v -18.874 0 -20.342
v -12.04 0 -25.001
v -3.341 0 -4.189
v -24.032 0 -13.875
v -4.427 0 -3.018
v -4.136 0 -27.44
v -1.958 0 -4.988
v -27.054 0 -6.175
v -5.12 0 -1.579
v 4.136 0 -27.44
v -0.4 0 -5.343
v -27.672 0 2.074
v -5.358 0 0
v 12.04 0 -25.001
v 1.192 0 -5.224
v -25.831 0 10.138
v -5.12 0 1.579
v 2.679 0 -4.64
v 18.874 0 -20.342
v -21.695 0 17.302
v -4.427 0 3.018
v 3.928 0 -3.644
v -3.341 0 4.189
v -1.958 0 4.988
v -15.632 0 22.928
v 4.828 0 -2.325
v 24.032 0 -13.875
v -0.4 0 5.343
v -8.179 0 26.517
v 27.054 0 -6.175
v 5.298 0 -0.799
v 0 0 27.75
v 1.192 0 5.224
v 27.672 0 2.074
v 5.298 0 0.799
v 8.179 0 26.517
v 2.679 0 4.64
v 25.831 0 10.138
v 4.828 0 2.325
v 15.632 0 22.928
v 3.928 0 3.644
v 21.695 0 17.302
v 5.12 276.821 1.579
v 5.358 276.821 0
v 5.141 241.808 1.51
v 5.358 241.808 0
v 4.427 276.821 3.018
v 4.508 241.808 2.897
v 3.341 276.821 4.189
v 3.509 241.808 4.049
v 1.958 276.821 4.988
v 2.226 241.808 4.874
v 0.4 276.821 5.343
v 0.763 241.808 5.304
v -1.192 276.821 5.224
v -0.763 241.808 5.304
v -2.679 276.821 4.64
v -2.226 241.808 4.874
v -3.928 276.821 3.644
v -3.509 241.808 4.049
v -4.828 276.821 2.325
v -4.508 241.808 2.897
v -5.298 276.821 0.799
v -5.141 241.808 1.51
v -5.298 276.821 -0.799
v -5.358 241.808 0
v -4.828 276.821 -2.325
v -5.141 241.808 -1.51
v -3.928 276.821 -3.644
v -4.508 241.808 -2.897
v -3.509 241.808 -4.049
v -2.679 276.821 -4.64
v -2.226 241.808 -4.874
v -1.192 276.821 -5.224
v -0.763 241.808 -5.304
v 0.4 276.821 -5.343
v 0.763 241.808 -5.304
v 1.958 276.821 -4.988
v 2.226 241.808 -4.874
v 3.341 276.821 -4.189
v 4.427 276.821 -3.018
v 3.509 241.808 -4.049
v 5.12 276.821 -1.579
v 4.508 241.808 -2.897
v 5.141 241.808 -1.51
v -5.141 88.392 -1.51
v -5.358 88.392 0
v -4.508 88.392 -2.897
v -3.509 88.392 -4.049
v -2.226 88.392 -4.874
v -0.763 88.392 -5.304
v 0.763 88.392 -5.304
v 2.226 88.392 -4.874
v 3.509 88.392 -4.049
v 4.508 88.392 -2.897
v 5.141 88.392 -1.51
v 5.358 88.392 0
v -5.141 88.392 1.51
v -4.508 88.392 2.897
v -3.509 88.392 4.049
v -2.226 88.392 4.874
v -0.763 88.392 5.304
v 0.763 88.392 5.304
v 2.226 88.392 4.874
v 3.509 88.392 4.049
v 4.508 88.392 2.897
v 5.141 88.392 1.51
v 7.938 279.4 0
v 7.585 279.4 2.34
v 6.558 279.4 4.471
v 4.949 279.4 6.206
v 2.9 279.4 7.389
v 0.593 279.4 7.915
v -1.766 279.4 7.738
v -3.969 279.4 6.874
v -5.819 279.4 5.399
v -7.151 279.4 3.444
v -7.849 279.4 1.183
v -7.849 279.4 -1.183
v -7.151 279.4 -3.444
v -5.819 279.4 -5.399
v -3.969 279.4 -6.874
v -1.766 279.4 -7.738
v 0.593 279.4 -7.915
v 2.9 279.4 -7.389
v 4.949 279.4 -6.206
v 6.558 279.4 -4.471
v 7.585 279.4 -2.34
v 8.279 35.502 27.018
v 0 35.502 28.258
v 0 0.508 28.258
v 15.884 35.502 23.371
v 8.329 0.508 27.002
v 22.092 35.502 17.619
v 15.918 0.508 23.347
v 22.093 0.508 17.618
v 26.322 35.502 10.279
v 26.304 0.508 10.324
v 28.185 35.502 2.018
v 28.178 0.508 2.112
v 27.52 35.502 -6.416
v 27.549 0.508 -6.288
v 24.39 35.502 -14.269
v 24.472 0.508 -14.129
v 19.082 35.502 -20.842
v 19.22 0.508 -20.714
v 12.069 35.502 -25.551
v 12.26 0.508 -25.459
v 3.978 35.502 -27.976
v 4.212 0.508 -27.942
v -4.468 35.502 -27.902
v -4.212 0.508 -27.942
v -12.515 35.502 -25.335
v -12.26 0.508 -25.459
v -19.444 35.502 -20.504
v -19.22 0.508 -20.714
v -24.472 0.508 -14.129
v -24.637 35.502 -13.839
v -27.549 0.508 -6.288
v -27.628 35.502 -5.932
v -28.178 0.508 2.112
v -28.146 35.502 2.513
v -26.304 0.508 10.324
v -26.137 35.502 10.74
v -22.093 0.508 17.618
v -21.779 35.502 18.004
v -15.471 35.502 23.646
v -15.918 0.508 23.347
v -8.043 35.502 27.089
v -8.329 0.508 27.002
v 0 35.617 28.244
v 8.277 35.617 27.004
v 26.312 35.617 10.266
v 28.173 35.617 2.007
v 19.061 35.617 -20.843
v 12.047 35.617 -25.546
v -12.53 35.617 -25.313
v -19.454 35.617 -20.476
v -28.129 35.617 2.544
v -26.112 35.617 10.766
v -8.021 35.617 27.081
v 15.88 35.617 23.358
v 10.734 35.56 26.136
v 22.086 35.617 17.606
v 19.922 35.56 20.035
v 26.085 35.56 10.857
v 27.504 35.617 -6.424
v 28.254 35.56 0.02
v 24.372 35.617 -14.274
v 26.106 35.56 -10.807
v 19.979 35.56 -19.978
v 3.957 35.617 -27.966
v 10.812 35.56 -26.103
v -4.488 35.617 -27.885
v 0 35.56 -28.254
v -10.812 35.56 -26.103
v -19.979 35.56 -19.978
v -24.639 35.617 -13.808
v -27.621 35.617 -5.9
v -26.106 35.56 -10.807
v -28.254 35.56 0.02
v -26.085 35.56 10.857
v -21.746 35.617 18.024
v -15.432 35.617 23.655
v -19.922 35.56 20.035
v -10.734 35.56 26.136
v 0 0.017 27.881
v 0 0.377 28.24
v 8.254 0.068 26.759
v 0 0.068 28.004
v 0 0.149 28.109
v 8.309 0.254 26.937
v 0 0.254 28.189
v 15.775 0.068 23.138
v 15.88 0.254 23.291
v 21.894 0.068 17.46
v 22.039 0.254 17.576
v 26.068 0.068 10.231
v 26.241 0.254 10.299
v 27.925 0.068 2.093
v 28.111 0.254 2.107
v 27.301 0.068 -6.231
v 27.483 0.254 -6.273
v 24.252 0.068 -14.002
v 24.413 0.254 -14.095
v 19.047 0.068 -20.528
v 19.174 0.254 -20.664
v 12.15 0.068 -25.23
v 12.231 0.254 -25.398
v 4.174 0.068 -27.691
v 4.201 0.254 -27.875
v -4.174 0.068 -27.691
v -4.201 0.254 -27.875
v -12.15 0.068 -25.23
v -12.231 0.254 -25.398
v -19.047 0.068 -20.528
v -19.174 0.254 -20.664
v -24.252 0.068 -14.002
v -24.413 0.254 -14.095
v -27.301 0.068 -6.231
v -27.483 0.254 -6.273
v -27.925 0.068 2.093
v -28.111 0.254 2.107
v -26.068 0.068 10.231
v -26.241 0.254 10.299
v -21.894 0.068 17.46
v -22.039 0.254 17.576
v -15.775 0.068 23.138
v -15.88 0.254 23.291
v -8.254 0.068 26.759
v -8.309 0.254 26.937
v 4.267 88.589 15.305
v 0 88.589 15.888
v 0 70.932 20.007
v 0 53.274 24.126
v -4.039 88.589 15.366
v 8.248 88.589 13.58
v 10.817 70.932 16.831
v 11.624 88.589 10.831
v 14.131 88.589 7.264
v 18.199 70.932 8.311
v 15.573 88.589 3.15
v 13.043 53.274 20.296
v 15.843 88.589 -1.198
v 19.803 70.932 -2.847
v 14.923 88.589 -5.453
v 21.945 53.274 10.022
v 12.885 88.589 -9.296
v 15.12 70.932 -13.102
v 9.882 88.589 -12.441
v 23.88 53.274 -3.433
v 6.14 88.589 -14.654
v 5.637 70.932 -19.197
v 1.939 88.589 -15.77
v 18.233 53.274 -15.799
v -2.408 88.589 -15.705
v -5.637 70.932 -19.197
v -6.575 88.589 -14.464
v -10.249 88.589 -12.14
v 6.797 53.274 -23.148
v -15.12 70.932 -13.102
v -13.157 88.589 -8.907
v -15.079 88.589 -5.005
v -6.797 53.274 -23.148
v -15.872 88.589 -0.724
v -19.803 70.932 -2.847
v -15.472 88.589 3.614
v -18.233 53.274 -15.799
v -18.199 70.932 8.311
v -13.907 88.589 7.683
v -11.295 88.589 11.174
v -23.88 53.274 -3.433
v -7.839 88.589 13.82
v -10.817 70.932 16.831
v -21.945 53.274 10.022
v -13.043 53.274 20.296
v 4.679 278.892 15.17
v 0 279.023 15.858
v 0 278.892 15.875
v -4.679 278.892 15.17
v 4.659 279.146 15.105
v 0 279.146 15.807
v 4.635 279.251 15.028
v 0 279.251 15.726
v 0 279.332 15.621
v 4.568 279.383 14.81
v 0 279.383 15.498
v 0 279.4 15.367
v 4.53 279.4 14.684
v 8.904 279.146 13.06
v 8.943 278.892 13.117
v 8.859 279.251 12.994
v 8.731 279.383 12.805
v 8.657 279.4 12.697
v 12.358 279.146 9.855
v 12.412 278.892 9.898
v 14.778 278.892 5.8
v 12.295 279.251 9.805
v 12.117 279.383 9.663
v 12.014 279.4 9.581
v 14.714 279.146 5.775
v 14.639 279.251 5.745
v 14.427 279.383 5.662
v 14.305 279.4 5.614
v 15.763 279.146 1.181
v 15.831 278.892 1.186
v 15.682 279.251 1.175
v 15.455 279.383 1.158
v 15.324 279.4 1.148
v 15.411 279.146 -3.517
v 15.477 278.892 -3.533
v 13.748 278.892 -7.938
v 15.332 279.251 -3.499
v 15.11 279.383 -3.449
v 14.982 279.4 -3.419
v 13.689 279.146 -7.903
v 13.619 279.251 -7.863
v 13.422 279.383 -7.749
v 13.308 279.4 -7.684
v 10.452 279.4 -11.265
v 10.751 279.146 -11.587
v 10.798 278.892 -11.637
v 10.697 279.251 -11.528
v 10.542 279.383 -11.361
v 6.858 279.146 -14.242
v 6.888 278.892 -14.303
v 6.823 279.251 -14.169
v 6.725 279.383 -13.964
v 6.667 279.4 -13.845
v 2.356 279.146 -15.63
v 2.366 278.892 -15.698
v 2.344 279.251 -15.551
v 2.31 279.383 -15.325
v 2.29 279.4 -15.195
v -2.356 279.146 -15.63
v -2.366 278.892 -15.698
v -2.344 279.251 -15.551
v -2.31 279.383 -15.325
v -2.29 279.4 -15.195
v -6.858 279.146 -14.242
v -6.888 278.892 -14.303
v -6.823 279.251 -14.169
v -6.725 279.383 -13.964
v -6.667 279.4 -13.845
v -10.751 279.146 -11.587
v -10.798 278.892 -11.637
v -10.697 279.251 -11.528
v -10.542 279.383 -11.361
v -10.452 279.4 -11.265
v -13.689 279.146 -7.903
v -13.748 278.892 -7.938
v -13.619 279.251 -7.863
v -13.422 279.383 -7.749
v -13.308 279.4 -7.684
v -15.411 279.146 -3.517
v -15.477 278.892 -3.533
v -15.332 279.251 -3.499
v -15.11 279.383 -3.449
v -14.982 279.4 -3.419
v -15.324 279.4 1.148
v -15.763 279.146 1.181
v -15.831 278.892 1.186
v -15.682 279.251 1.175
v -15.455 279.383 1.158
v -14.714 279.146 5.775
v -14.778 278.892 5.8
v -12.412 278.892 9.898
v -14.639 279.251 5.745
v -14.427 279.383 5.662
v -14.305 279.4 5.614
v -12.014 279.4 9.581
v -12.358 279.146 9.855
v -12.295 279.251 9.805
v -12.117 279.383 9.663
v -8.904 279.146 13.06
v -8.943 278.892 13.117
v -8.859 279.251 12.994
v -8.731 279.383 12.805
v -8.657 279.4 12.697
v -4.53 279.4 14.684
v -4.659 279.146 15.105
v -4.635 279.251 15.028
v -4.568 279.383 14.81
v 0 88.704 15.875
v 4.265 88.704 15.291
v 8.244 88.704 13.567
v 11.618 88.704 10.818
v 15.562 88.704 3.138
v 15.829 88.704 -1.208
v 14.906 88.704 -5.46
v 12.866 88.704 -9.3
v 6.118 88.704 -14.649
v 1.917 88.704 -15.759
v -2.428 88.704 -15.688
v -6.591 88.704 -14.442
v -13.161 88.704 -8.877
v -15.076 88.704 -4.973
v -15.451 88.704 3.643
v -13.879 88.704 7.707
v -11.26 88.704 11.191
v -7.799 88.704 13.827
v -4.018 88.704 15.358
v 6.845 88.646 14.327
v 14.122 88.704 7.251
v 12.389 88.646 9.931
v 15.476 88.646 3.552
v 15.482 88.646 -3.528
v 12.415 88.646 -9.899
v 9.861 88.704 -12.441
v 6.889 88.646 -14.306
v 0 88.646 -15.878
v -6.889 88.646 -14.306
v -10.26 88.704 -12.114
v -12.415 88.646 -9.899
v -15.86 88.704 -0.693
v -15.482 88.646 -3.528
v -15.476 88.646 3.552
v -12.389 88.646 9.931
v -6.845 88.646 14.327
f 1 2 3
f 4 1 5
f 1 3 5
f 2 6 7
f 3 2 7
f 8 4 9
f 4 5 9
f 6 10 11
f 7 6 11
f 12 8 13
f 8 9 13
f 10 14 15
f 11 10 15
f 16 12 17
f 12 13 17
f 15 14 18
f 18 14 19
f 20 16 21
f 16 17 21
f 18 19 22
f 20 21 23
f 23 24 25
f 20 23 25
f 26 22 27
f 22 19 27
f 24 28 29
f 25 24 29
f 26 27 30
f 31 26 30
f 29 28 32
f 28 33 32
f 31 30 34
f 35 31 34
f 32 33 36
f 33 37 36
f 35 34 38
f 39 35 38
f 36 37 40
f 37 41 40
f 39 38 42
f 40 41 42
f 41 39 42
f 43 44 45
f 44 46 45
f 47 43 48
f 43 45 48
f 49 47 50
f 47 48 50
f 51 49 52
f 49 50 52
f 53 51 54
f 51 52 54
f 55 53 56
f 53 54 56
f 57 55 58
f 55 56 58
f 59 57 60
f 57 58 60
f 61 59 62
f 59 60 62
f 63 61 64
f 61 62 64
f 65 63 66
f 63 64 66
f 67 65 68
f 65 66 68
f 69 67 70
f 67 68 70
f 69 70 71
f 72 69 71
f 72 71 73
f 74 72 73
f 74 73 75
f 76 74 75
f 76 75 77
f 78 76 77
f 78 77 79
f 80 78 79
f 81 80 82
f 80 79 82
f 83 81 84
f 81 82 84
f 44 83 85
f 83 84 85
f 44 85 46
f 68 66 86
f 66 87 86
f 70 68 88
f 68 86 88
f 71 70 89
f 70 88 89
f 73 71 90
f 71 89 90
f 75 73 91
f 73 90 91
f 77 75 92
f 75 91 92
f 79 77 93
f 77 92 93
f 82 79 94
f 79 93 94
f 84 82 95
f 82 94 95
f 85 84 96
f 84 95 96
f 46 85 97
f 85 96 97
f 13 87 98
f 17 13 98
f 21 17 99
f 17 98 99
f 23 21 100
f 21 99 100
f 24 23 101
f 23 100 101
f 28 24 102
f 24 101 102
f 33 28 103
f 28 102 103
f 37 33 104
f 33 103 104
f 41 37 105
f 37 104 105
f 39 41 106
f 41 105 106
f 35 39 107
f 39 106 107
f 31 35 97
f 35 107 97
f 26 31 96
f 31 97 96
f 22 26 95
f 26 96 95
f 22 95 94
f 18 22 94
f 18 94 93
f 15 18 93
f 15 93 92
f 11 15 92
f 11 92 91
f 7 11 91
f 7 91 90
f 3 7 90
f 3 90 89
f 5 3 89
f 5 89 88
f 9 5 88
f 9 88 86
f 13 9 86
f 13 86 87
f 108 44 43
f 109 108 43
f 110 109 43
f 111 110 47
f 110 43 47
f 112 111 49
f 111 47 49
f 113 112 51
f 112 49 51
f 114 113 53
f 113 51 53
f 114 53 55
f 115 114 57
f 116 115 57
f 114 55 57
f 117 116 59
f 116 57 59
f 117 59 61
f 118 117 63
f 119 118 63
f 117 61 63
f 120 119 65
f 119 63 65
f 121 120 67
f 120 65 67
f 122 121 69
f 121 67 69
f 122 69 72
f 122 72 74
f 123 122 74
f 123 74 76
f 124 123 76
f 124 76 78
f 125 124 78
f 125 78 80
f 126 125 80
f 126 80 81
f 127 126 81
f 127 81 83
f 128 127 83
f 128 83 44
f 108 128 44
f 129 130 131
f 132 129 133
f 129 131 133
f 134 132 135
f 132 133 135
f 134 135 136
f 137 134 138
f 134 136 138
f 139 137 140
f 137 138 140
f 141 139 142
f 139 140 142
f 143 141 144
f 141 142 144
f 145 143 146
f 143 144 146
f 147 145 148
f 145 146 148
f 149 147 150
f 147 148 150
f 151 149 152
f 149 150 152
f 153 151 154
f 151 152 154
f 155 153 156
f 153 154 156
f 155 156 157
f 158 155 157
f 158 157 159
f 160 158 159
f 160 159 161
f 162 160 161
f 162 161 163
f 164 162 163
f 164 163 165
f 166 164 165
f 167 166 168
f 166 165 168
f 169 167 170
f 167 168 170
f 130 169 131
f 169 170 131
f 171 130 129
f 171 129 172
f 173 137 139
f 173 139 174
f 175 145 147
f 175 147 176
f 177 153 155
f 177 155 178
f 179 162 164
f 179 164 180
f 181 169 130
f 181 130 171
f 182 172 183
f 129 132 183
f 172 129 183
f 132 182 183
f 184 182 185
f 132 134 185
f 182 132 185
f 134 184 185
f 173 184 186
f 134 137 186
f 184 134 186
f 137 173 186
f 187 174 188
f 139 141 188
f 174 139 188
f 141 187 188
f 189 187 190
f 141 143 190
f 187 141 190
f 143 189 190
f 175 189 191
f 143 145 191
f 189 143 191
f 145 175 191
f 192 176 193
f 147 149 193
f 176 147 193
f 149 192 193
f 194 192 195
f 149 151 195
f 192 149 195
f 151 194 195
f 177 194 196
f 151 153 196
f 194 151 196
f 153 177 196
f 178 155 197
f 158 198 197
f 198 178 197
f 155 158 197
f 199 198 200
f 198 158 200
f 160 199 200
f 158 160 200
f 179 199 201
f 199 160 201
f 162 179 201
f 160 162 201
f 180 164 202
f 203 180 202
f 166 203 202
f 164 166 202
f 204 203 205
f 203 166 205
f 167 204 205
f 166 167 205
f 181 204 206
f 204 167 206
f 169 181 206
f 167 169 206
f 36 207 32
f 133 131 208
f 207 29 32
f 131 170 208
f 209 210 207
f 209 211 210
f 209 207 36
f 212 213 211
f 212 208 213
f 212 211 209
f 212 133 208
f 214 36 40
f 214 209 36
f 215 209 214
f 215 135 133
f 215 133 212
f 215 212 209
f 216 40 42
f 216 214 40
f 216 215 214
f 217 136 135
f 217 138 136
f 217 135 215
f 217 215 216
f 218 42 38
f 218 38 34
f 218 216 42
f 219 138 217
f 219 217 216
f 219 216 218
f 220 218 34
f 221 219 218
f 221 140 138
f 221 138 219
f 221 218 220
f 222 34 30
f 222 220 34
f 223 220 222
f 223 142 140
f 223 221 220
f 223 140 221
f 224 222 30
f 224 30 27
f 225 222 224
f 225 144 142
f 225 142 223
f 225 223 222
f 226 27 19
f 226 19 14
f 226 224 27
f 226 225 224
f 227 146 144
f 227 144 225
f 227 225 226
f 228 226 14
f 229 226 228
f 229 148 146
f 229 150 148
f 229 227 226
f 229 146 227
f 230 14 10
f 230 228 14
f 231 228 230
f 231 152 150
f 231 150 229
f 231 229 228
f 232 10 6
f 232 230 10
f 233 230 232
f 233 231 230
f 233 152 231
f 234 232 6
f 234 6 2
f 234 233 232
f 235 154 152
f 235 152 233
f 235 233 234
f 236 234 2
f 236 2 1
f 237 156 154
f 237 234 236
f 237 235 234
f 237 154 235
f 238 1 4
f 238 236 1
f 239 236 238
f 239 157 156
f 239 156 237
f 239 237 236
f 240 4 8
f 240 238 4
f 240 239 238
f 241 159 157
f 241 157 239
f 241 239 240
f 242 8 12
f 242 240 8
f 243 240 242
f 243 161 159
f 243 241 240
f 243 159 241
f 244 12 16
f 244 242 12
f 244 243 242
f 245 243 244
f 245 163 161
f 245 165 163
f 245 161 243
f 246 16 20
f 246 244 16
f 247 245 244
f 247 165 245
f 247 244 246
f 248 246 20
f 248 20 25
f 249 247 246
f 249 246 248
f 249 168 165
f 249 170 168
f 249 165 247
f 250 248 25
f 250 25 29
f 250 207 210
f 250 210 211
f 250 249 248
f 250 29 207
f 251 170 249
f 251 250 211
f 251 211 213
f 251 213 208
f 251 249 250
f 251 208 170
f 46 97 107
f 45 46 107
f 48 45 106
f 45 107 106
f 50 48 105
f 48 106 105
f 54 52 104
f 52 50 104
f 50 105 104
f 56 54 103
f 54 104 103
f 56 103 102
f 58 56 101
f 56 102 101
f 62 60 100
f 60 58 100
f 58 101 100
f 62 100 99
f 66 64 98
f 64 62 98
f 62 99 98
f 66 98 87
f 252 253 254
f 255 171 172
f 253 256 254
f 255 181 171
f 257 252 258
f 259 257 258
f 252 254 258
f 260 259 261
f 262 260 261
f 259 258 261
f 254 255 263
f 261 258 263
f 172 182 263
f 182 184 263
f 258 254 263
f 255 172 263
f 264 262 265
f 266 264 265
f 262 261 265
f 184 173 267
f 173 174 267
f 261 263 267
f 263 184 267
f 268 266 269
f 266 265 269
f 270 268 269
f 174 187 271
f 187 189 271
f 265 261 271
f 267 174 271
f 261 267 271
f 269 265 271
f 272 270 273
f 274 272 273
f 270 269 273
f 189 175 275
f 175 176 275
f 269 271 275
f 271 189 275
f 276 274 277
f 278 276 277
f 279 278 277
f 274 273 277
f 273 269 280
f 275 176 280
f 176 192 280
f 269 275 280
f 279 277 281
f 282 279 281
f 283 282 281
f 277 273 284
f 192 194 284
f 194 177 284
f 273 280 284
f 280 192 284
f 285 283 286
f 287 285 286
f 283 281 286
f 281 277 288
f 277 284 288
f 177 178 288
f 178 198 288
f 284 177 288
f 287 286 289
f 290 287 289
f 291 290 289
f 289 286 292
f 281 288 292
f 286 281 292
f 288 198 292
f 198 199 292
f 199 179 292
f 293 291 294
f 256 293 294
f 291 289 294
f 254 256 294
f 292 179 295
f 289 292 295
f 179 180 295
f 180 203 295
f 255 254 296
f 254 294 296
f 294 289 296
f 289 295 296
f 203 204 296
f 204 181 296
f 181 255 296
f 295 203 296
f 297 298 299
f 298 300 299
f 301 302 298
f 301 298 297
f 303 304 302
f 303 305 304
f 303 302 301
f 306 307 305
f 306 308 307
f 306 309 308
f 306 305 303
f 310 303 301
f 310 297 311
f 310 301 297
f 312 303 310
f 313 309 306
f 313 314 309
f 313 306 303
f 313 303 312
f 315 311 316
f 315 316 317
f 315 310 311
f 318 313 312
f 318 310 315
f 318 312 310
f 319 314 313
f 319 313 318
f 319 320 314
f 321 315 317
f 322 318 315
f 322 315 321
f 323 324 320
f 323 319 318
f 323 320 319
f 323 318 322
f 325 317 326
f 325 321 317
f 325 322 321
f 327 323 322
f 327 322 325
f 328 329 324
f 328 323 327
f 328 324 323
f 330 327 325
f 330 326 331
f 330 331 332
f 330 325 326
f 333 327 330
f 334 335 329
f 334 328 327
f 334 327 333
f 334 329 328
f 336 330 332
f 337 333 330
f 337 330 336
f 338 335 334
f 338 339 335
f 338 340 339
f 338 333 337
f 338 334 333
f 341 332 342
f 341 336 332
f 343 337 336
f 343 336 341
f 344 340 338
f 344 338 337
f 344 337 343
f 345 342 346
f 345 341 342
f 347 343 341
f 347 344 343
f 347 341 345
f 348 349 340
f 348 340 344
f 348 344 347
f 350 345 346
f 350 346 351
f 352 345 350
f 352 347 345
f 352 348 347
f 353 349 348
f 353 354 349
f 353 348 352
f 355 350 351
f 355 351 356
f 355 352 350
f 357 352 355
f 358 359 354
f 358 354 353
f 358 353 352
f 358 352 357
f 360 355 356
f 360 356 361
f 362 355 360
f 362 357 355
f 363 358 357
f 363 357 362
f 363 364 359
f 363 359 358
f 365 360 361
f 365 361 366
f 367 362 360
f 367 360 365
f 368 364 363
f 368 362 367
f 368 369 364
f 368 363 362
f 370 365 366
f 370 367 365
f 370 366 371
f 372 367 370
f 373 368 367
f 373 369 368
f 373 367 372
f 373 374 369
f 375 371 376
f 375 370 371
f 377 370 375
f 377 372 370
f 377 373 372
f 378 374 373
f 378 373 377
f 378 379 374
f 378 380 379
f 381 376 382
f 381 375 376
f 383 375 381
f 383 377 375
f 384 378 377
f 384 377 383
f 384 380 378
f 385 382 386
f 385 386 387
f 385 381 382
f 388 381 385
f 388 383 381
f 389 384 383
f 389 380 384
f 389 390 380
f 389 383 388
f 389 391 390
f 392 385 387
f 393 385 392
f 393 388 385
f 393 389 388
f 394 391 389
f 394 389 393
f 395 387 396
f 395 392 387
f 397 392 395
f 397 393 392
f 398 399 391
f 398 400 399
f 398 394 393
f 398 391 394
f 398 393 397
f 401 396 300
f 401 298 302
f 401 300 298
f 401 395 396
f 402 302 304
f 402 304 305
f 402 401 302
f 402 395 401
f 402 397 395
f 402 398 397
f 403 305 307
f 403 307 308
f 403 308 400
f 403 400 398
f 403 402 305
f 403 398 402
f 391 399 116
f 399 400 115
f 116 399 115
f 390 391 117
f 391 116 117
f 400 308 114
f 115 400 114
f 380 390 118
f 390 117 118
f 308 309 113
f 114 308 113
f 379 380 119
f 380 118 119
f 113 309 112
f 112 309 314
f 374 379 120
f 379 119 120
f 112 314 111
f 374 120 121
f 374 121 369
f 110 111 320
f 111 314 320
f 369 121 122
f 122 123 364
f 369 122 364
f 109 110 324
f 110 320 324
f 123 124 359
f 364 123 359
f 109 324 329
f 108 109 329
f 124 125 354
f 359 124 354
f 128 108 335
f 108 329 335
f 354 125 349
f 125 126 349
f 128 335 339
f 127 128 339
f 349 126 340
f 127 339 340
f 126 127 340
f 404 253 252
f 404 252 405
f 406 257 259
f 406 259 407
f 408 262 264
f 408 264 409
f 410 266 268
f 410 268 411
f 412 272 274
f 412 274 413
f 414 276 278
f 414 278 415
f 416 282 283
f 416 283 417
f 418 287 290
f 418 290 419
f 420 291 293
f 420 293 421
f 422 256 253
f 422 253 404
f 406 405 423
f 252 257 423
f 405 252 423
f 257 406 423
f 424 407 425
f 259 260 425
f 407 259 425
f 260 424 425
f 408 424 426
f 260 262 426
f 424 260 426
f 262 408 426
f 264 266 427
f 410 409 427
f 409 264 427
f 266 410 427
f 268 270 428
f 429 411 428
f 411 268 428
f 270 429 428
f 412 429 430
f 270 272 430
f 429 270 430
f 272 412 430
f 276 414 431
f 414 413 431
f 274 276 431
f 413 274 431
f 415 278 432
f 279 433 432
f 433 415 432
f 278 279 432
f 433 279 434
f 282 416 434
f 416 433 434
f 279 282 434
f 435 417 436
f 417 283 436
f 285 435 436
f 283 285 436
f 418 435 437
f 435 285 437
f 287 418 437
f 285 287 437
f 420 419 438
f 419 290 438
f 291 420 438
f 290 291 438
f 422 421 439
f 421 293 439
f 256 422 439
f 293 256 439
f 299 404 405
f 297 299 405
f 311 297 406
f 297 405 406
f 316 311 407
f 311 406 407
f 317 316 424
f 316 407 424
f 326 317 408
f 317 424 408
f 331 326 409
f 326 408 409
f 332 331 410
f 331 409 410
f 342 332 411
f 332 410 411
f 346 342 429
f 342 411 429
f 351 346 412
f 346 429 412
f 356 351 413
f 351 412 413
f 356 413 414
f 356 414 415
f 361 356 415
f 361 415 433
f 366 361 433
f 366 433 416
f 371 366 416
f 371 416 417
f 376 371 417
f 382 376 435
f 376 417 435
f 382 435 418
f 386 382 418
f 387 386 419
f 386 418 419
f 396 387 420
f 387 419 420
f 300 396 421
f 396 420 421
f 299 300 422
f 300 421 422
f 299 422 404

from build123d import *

# Parameters (mm, degrees)
F3_D           = 10.71626
F3_DEPTH       = 191.008
F3_CSINK_D     = 15.875
F3_CSINK_ANGLE = 90
F5_D           = 10.71626
F5_DEPTH       = 241.808
F6_R           = 0.508


with BuildPart() as f1:
    # F0 (on Right) → F1 (revolve)
    with BuildSketch(Plane.YZ):
        Polygon((0, 28.2575), (0, 0), (279.4, 0), (279.4, 15.875), (88.646, 15.875), (35.56, 28.2575), align=None)
    revolve(axis=Axis((0, 139.7, 0), (0, 1, 0)))

    # F3
    with Locations(Plane(origin=(0, 279.4, 0), x_dir=(-1, 0, 0), z_dir=(0, 1, 0))):
        with Locations((0, 0)):
            CounterSinkHole(F3_D / 2, F3_CSINK_D / 2, depth=F3_DEPTH, counter_sink_angle=F3_CSINK_ANGLE)

    # F5
    with Locations(Plane.XZ):
        with Locations((0, 0)):
            Hole(F5_D / 2, depth=F5_DEPTH)

    # F6
    f6_edges = [f1.edges().sort_by_distance(p)[0] for p in [
        (0, 0, -28.2575),
        (0, 35.56, -28.2575),
        (0, 88.646, -15.875),
        (0, 279.4, -15.875),
    ]]
    fillet(f6_edges, radius=F6_R)


solid = f1.part
